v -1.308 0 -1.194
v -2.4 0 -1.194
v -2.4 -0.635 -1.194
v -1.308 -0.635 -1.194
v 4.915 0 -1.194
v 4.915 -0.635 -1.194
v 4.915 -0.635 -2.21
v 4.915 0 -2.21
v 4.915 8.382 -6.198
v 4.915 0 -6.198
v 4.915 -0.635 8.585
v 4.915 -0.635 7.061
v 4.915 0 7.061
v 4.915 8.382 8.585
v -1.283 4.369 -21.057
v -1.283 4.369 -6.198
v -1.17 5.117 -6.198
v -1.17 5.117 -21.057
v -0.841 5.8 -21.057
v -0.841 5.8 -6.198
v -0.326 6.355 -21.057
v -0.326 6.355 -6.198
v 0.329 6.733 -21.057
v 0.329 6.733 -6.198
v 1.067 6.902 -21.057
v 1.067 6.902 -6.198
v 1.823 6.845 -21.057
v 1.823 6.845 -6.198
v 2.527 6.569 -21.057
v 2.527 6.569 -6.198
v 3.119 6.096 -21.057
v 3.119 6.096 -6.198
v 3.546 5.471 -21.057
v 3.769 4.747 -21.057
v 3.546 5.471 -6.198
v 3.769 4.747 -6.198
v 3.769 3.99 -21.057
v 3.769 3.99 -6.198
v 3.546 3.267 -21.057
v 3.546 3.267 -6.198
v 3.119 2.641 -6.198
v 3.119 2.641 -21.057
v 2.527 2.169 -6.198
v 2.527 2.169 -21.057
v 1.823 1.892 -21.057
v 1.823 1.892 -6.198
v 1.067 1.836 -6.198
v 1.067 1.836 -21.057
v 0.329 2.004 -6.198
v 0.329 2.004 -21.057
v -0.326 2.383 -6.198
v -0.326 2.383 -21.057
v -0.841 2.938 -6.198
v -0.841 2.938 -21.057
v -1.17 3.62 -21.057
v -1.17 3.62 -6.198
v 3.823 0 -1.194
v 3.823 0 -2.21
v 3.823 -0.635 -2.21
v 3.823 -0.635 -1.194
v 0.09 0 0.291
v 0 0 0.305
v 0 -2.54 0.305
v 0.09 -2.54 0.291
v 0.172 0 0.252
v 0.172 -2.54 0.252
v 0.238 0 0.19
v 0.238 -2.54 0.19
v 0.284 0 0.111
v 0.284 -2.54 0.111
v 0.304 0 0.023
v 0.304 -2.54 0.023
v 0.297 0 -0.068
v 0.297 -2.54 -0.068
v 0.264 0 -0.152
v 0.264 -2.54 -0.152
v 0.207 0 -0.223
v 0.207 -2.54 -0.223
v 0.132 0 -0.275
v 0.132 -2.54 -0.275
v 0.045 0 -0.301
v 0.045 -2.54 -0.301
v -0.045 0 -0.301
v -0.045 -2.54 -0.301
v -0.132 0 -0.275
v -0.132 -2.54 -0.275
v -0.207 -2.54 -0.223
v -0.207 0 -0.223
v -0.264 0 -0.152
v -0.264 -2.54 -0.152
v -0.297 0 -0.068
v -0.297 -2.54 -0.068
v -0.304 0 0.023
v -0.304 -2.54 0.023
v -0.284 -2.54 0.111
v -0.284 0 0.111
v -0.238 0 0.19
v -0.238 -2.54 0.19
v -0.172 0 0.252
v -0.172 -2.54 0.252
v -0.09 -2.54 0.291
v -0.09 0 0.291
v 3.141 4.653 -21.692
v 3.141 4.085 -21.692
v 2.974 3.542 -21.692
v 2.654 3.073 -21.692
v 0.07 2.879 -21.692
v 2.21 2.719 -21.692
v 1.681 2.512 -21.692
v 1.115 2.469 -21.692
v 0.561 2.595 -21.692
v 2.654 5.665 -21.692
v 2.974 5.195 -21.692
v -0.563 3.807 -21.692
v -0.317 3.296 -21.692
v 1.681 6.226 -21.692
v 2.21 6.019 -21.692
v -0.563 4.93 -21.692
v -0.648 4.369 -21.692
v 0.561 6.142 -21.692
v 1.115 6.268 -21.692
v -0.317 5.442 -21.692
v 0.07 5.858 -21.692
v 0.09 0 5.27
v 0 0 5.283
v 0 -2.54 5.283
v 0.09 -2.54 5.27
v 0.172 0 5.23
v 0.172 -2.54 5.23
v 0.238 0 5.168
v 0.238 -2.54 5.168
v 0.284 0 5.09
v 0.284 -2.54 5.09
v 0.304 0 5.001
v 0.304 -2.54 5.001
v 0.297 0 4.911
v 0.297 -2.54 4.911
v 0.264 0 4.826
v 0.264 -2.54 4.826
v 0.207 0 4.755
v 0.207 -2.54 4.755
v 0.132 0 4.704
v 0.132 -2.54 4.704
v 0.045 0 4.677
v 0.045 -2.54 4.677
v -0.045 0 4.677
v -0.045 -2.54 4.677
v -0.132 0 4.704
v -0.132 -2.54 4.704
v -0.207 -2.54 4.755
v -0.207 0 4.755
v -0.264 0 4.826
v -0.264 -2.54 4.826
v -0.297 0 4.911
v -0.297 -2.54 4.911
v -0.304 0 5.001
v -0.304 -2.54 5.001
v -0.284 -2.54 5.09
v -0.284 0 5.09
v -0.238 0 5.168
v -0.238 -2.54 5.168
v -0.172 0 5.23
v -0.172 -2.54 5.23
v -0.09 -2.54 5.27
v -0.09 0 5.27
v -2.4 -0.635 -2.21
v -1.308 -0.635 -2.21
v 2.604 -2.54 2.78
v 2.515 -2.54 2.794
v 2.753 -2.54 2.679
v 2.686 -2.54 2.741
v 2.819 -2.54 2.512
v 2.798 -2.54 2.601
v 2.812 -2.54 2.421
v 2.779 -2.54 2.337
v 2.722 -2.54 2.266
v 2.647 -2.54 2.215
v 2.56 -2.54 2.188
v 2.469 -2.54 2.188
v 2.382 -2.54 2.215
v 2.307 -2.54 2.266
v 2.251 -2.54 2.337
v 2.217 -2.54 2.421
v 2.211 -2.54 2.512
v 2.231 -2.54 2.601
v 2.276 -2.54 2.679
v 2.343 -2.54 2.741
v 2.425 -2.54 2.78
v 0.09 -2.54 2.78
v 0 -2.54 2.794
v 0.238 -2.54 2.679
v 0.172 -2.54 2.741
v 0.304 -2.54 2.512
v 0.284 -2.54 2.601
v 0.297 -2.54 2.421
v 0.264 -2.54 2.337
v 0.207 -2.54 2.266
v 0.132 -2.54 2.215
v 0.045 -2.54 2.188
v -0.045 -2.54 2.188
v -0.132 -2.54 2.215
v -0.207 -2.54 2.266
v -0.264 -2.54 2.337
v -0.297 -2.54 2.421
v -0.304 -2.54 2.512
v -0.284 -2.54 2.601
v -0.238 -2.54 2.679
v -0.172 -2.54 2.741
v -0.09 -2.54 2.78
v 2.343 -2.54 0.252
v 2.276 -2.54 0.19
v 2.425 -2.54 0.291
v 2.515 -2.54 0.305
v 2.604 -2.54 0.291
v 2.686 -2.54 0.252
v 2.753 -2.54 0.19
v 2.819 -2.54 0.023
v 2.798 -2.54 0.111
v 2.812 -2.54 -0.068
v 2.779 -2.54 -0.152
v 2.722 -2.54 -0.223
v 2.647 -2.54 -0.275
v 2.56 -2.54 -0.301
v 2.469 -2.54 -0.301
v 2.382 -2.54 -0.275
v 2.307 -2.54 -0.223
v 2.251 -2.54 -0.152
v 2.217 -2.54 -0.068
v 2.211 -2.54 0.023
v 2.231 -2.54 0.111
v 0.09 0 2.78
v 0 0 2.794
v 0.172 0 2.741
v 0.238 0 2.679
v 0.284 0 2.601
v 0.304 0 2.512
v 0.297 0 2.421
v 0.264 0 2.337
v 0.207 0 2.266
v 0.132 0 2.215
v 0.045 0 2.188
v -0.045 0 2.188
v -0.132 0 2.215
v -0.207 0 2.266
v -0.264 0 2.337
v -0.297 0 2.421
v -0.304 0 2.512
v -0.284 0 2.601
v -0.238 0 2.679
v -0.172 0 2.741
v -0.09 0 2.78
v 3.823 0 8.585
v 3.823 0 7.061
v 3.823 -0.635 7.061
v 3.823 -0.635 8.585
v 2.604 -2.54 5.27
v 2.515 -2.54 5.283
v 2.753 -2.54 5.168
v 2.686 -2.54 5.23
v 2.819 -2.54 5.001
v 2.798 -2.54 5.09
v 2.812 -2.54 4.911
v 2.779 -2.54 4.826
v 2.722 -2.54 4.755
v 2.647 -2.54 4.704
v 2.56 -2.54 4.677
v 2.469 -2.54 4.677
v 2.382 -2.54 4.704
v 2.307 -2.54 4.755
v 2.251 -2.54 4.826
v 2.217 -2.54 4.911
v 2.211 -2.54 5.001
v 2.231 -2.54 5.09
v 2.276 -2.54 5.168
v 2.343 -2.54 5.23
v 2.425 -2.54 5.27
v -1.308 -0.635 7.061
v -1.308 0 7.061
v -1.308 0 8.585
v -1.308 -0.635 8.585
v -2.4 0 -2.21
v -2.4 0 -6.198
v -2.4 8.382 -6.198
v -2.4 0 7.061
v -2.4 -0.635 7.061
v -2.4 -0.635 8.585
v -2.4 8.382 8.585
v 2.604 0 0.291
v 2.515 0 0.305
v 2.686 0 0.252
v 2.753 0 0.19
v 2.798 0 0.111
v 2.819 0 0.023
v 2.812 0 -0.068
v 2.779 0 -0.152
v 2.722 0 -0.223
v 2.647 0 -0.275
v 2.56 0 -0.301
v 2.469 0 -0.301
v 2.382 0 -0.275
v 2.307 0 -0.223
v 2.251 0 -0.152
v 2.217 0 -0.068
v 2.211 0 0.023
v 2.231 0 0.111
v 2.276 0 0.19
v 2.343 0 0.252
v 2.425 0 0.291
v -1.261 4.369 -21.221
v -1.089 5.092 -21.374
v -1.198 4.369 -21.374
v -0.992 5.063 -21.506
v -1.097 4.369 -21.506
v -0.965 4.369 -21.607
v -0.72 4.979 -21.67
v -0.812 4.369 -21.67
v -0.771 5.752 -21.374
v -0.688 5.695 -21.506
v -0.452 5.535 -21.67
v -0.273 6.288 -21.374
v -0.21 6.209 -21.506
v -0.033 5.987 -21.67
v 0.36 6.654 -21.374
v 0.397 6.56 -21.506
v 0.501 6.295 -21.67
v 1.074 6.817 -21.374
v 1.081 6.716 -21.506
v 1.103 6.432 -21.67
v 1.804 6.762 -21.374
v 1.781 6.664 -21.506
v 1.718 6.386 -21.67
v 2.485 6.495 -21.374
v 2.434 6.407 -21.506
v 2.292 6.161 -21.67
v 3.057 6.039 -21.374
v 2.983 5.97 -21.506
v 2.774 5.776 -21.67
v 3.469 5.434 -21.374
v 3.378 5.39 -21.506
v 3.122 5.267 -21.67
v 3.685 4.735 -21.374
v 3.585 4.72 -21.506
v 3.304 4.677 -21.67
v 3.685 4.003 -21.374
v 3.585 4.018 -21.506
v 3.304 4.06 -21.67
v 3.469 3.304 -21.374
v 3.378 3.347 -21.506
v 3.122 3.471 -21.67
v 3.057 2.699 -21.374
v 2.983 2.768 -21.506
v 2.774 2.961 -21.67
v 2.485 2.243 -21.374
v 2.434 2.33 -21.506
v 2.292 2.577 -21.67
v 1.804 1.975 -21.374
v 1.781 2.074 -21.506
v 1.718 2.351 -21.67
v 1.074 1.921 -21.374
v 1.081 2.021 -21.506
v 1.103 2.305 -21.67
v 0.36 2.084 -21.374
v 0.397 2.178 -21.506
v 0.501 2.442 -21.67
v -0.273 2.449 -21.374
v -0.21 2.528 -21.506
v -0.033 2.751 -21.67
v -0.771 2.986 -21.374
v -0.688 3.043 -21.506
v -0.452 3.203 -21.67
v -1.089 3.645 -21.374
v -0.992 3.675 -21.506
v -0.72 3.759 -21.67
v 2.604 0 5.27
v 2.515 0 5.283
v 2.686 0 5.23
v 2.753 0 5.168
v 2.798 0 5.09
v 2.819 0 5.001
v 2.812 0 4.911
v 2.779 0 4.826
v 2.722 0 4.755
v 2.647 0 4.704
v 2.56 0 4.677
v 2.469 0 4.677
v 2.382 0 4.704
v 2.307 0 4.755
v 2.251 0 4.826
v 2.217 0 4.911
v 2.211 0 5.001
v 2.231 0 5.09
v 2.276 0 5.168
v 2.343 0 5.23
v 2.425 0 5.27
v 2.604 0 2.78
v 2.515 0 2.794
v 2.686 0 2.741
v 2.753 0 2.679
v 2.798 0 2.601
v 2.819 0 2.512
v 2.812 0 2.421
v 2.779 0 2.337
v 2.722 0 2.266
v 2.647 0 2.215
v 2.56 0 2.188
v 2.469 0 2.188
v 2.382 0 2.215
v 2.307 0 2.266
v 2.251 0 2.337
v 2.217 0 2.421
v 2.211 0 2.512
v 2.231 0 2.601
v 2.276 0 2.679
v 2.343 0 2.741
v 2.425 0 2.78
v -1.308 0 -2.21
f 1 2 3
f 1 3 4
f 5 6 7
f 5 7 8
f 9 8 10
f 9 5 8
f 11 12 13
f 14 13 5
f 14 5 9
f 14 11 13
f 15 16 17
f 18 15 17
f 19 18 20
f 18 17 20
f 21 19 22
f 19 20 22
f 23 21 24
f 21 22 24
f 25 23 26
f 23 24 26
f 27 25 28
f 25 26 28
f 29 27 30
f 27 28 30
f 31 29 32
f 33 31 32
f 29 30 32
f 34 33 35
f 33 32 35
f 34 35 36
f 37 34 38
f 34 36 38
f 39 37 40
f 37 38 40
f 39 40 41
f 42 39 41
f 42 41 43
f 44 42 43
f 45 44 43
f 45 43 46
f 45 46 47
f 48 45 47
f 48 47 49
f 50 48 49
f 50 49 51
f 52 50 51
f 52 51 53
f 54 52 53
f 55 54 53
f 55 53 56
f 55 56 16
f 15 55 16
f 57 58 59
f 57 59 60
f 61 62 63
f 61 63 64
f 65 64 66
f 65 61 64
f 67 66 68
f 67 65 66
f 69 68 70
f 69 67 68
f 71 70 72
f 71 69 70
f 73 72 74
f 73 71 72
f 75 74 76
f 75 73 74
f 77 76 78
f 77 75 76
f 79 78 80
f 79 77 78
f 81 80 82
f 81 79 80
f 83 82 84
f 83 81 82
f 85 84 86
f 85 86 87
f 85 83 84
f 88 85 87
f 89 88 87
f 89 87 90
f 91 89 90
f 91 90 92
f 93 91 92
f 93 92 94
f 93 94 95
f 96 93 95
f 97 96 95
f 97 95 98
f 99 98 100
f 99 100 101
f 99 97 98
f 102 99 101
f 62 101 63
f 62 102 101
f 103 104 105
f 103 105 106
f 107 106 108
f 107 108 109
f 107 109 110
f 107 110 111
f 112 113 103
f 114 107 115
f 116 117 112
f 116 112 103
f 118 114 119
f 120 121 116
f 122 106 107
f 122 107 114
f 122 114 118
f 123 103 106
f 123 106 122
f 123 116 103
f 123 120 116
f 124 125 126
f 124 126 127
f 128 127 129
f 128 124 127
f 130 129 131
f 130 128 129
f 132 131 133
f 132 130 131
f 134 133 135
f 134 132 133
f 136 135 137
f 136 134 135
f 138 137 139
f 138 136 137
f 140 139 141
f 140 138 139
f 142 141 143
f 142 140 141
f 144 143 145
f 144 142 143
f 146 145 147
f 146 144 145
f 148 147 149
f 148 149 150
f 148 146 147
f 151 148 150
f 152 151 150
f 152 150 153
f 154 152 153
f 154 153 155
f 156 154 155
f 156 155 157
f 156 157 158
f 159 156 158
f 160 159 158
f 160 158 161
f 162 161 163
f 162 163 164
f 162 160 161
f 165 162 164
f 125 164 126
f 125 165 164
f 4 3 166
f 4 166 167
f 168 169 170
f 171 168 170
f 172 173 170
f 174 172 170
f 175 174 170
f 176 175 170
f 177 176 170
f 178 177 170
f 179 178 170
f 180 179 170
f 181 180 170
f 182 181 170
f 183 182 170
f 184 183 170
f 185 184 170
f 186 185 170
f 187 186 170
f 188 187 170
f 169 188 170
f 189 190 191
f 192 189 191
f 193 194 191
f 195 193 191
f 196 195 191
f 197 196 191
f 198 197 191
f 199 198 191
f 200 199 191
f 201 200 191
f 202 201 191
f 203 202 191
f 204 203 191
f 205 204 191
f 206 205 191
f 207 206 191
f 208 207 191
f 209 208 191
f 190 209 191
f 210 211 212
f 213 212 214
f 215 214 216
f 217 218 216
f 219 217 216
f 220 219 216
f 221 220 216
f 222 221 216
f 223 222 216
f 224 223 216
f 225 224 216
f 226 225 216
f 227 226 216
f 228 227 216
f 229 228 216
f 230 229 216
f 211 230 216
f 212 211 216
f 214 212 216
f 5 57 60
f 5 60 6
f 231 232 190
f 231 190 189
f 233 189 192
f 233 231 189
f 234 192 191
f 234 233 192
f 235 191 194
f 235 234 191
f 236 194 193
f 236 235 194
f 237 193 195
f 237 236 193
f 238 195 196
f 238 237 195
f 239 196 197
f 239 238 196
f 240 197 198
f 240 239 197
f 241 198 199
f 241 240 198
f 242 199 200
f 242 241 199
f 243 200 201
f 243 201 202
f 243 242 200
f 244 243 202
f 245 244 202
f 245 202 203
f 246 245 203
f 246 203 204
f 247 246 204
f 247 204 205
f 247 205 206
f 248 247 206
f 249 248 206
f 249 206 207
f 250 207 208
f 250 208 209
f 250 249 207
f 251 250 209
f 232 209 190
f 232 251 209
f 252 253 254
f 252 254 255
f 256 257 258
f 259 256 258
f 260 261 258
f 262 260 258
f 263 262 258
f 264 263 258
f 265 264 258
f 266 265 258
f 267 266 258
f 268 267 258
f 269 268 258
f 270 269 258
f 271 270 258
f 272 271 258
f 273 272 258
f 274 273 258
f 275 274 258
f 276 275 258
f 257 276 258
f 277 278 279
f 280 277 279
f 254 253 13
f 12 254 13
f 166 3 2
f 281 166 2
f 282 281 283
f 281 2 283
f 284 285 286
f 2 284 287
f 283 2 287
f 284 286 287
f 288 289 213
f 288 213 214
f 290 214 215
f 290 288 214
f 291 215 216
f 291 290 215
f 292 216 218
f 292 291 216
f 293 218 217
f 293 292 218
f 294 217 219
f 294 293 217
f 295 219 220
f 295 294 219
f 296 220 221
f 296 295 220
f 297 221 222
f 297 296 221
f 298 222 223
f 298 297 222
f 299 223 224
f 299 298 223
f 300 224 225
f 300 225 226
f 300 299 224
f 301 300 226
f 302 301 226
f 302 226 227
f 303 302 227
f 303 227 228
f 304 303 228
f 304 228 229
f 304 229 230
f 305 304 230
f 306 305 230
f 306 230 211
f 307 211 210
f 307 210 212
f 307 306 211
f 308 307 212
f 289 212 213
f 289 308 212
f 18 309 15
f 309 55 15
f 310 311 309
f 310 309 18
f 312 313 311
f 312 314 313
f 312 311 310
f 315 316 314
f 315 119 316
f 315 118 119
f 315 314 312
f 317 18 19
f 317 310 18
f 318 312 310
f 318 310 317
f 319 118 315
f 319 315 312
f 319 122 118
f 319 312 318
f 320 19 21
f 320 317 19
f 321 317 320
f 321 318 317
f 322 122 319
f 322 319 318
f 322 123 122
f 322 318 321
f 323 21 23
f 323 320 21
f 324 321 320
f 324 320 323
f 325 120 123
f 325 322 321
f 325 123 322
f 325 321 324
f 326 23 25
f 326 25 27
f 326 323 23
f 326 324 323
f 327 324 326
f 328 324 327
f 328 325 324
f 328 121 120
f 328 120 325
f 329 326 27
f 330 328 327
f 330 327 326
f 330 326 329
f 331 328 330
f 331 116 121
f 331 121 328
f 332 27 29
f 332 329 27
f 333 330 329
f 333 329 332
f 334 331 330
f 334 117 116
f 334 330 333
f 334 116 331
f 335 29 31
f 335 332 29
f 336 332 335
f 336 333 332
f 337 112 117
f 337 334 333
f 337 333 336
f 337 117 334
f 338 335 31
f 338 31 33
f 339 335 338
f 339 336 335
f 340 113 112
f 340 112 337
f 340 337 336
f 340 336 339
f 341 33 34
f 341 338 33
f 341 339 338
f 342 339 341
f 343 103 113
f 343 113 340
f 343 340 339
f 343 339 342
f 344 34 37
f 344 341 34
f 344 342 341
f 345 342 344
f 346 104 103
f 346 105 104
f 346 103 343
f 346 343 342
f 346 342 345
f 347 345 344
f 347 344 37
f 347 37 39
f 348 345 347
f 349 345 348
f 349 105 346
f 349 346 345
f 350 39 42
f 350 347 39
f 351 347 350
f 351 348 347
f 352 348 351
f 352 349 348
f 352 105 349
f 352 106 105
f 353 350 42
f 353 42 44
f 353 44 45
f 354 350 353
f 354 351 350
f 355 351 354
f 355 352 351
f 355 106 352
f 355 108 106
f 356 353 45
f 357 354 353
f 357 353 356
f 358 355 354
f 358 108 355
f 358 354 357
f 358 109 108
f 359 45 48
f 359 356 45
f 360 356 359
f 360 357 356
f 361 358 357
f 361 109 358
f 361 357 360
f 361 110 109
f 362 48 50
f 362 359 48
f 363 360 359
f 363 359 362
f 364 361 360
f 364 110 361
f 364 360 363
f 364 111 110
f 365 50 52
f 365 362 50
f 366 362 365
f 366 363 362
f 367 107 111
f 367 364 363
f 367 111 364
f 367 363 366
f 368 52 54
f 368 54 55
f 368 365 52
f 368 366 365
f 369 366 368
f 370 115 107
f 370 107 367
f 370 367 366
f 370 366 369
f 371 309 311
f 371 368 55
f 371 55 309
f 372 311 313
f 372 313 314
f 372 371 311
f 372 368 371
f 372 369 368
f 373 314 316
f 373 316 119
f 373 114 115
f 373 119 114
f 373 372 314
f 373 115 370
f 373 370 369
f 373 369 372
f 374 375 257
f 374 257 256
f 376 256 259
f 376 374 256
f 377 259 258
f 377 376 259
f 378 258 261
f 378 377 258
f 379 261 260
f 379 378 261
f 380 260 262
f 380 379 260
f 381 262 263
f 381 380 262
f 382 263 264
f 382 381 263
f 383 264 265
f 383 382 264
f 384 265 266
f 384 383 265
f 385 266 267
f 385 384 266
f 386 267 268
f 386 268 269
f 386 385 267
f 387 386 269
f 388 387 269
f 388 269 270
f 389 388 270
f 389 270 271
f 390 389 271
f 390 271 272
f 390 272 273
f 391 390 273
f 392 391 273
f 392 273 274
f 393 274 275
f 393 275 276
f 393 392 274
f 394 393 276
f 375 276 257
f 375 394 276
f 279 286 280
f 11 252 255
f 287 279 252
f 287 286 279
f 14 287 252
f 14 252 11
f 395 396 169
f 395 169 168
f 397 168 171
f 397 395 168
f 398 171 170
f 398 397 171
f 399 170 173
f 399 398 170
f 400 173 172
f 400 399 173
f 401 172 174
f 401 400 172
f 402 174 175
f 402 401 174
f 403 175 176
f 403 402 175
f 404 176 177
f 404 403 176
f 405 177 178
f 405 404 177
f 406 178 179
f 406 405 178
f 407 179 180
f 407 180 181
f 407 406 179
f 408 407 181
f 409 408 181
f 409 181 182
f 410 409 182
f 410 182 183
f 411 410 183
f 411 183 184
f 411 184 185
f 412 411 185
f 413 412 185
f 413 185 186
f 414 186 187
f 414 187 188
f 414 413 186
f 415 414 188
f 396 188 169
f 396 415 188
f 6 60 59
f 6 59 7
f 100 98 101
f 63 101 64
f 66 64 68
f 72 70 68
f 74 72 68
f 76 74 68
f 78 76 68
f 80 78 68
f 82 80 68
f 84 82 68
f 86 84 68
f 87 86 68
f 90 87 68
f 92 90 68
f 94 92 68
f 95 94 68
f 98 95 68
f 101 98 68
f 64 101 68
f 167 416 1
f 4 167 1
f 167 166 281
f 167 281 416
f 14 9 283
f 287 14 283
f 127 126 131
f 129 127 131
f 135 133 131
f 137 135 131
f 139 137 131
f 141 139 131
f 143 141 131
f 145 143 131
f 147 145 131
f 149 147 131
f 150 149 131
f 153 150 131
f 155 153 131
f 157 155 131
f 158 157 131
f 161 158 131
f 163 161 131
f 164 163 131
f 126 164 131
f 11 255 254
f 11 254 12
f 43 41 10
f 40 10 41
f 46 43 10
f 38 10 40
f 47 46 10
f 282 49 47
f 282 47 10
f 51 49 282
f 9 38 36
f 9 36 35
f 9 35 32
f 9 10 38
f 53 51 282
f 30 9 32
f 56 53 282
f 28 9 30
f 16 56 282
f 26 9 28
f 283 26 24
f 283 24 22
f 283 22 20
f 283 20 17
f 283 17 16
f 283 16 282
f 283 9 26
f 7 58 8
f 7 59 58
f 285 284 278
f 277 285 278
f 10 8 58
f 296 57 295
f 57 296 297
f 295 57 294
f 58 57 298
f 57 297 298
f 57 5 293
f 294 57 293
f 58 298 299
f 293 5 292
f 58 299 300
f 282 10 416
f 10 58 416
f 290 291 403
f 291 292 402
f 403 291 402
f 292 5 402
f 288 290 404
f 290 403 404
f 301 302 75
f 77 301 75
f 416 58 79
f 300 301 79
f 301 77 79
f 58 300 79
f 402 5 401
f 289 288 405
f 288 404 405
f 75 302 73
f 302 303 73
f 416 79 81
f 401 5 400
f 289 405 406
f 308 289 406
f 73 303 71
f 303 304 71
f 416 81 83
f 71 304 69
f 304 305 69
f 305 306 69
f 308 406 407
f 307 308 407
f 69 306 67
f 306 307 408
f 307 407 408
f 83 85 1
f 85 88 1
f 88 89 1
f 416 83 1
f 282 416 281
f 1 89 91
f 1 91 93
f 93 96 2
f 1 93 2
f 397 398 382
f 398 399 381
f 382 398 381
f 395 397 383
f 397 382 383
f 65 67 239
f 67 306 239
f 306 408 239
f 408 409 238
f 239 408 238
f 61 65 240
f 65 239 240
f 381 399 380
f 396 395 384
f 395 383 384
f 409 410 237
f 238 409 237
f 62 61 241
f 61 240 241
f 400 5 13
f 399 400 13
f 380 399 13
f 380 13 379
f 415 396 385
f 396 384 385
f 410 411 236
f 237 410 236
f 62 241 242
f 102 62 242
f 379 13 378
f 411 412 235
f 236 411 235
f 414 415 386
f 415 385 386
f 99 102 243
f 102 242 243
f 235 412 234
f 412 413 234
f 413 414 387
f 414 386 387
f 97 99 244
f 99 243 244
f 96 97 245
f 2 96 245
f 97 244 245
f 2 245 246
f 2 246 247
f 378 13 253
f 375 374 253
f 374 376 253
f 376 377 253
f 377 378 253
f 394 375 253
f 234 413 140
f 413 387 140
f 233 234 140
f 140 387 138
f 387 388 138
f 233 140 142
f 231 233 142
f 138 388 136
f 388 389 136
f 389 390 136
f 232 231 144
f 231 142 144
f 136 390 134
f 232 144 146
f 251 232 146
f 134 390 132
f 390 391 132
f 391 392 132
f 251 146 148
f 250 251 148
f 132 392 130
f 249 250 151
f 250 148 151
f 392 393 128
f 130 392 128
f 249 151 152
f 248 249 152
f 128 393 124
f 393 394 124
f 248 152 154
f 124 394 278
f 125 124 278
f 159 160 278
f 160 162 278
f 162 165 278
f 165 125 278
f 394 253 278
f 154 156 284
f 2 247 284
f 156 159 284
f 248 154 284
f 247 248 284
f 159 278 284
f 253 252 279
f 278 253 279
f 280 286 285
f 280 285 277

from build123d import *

# Parameters (mm, degrees)
SKETCH1_R           = 0.3048
PINS_DEPTH          = 2.54
PINS_2_DEPTH        = 2.54
PINS_3_DEPTH        = 2.54
PINS_4_DEPTH        = 2.54
PINS_5_DEPTH        = 2.54
PINS_6_DEPTH        = 2.54
SKETCH2_W           = 7.3152
SKETCH2_H           = 10.795
MAIN_BODY_DEPTH     = 8.382
SKETCH3_W           = 1.0922
SKETCH3_H           = 1.524
SKETCH3_H_2         = 1.016
FEET_DEPTH          = 0.635
SKETCH5_W           = 7.3152
SKETCH5_H           = 8.382
BOSS_EXTRUDE5_DEPTH = 3.9878
SKETCH4_R           = 2.54
CUP_DEPTH           = 19.4818
SKETCH6_R           = 2.3495
SPRING_DEPTH        = 6.5532
FILLET1_R           = 0.635


with BuildPart() as part:
    # Sketch1 → Pins (new body)
    with BuildSketch(Plane(origin=(0, 0, 0), x_dir=(1, 0, 0), z_dir=(0, 1, 0))):
        with Locations(Location((0, 0, 0), (0, 0, 270))):
            Circle(SKETCH1_R)
    extrude(amount=-PINS_DEPTH)



with BuildPart() as body_2:
    # Sketch1 → Pins 2 (new body)
    with BuildSketch(Plane(origin=(0, 0, 0), x_dir=(1, 0, 0), z_dir=(0, 1, 0))):
        with Locations(Location((0, -2.4892, 0), (0, 0, 270))):
            Circle(SKETCH1_R)
    extrude(amount=-PINS_2_DEPTH)


with BuildPart() as body_3:
    # Sketch1 → Pins 3 (new body)
    with BuildSketch(Plane(origin=(0, 0, 0), x_dir=(1, 0, 0), z_dir=(0, 1, 0))):
        with Locations(Location((0, -4.9784, 0), (0, 0, 270))):
            Circle(SKETCH1_R)
    extrude(amount=-PINS_3_DEPTH)


with BuildPart() as body_4:
    # Sketch1 → Pins 4 (new body)
    with BuildSketch(Plane(origin=(0, 0, 0), x_dir=(1, 0, 0), z_dir=(0, 1, 0))):
        with Locations(Location((2.5146, 0, 0), (0, 0, 270))):
            Circle(SKETCH1_R)
    extrude(amount=-PINS_4_DEPTH)


with BuildPart() as body_5:
    # Sketch1 → Pins 5 (new body)
    with BuildSketch(Plane(origin=(0, 0, 0), x_dir=(1, 0, 0), z_dir=(0, 1, 0))):
        with Locations(Location((2.5146, -2.4892, 0), (0, 0, 270))):
            Circle(SKETCH1_R)
    extrude(amount=-PINS_5_DEPTH)


with BuildPart() as body_6:
    # Sketch1 → Pins 6 (new body)
    with BuildSketch(Plane(origin=(0, 0, 0), x_dir=(1, 0, 0), z_dir=(0, 1, 0))):
        with Locations(Location((2.5146, -4.9784, 0), (0, 0, 270))):
            Circle(SKETCH1_R)
    extrude(amount=-PINS_6_DEPTH)


with BuildPart() as part_1:
    add(part.part)

    add(body_2.part)  # Main Body merges body 2

    add(body_3.part)  # Main Body merges body 3

    add(body_4.part)  # Main Body merges body 4

    add(body_5.part)  # Main Body merges body 5

    add(body_6.part)  # Main Body merges body 6
    # Sketch2 → Main Body (add)
    with BuildSketch(Plane(origin=(0, 0, 0), x_dir=(1, 0, 0), z_dir=(0, 1, 0))):
        with Locations((1.2573, -3.1877)):
            Rectangle(SKETCH2_W, SKETCH2_H)
    extrude(amount=MAIN_BODY_DEPTH)

    # Sketch3 → Feet (add)
    with BuildSketch(Plane.XZ):
        with Locations((-1.8542, 7.8232)):
            Rectangle(SKETCH3_W, SKETCH3_H)
        with Locations((4.3688, 7.8232)):
            Rectangle(SKETCH3_W, SKETCH3_H)
        with Locations((4.3688, -1.7018)):
            Rectangle(SKETCH3_W, SKETCH3_H_2)
        with Locations((-1.8542, -1.7018)):
            Rectangle(SKETCH3_W, SKETCH3_H_2)
    extrude(amount=FEET_DEPTH)

    # Sketch5 → Boss-Extrude5 (add)
    with BuildSketch(Plane(origin=(0, 0, -2.2098), x_dir=(-1, 0, 0), z_dir=(0, 0, -1))):
        with Locations((-1.2573, 4.191)):
            Rectangle(SKETCH5_W, SKETCH5_H)
    extrude(amount=BOSS_EXTRUDE5_DEPTH)

    # Sketch4 → Cup (add)
    with BuildSketch(Plane(origin=(0, 0, -2.2098), x_dir=(-1, 0, 0), z_dir=(0, 0, -1))):
        with Locations((-1.2573, 4.3688)):
            Circle(SKETCH4_R)
    extrude(amount=CUP_DEPTH)

    # Sketch6 → Spring (add)
    with BuildSketch(Plane(origin=(0, 0, -6.1976), x_dir=(-1, 0, 0), z_dir=(0, 0, -1))):
        with Locations((-1.2573, 4.3688)):
            Circle(SKETCH6_R)
    extrude(amount=SPRING_DEPTH)

    # Fillet1
    fillet1_edges = [part_1.edges().sort_by_distance(p)[0] for p in [
        (3.7973, 4.3688, -21.6916),
    ]]
    fillet(fillet1_edges, radius=FILLET1_R)


solid = part_1.part
